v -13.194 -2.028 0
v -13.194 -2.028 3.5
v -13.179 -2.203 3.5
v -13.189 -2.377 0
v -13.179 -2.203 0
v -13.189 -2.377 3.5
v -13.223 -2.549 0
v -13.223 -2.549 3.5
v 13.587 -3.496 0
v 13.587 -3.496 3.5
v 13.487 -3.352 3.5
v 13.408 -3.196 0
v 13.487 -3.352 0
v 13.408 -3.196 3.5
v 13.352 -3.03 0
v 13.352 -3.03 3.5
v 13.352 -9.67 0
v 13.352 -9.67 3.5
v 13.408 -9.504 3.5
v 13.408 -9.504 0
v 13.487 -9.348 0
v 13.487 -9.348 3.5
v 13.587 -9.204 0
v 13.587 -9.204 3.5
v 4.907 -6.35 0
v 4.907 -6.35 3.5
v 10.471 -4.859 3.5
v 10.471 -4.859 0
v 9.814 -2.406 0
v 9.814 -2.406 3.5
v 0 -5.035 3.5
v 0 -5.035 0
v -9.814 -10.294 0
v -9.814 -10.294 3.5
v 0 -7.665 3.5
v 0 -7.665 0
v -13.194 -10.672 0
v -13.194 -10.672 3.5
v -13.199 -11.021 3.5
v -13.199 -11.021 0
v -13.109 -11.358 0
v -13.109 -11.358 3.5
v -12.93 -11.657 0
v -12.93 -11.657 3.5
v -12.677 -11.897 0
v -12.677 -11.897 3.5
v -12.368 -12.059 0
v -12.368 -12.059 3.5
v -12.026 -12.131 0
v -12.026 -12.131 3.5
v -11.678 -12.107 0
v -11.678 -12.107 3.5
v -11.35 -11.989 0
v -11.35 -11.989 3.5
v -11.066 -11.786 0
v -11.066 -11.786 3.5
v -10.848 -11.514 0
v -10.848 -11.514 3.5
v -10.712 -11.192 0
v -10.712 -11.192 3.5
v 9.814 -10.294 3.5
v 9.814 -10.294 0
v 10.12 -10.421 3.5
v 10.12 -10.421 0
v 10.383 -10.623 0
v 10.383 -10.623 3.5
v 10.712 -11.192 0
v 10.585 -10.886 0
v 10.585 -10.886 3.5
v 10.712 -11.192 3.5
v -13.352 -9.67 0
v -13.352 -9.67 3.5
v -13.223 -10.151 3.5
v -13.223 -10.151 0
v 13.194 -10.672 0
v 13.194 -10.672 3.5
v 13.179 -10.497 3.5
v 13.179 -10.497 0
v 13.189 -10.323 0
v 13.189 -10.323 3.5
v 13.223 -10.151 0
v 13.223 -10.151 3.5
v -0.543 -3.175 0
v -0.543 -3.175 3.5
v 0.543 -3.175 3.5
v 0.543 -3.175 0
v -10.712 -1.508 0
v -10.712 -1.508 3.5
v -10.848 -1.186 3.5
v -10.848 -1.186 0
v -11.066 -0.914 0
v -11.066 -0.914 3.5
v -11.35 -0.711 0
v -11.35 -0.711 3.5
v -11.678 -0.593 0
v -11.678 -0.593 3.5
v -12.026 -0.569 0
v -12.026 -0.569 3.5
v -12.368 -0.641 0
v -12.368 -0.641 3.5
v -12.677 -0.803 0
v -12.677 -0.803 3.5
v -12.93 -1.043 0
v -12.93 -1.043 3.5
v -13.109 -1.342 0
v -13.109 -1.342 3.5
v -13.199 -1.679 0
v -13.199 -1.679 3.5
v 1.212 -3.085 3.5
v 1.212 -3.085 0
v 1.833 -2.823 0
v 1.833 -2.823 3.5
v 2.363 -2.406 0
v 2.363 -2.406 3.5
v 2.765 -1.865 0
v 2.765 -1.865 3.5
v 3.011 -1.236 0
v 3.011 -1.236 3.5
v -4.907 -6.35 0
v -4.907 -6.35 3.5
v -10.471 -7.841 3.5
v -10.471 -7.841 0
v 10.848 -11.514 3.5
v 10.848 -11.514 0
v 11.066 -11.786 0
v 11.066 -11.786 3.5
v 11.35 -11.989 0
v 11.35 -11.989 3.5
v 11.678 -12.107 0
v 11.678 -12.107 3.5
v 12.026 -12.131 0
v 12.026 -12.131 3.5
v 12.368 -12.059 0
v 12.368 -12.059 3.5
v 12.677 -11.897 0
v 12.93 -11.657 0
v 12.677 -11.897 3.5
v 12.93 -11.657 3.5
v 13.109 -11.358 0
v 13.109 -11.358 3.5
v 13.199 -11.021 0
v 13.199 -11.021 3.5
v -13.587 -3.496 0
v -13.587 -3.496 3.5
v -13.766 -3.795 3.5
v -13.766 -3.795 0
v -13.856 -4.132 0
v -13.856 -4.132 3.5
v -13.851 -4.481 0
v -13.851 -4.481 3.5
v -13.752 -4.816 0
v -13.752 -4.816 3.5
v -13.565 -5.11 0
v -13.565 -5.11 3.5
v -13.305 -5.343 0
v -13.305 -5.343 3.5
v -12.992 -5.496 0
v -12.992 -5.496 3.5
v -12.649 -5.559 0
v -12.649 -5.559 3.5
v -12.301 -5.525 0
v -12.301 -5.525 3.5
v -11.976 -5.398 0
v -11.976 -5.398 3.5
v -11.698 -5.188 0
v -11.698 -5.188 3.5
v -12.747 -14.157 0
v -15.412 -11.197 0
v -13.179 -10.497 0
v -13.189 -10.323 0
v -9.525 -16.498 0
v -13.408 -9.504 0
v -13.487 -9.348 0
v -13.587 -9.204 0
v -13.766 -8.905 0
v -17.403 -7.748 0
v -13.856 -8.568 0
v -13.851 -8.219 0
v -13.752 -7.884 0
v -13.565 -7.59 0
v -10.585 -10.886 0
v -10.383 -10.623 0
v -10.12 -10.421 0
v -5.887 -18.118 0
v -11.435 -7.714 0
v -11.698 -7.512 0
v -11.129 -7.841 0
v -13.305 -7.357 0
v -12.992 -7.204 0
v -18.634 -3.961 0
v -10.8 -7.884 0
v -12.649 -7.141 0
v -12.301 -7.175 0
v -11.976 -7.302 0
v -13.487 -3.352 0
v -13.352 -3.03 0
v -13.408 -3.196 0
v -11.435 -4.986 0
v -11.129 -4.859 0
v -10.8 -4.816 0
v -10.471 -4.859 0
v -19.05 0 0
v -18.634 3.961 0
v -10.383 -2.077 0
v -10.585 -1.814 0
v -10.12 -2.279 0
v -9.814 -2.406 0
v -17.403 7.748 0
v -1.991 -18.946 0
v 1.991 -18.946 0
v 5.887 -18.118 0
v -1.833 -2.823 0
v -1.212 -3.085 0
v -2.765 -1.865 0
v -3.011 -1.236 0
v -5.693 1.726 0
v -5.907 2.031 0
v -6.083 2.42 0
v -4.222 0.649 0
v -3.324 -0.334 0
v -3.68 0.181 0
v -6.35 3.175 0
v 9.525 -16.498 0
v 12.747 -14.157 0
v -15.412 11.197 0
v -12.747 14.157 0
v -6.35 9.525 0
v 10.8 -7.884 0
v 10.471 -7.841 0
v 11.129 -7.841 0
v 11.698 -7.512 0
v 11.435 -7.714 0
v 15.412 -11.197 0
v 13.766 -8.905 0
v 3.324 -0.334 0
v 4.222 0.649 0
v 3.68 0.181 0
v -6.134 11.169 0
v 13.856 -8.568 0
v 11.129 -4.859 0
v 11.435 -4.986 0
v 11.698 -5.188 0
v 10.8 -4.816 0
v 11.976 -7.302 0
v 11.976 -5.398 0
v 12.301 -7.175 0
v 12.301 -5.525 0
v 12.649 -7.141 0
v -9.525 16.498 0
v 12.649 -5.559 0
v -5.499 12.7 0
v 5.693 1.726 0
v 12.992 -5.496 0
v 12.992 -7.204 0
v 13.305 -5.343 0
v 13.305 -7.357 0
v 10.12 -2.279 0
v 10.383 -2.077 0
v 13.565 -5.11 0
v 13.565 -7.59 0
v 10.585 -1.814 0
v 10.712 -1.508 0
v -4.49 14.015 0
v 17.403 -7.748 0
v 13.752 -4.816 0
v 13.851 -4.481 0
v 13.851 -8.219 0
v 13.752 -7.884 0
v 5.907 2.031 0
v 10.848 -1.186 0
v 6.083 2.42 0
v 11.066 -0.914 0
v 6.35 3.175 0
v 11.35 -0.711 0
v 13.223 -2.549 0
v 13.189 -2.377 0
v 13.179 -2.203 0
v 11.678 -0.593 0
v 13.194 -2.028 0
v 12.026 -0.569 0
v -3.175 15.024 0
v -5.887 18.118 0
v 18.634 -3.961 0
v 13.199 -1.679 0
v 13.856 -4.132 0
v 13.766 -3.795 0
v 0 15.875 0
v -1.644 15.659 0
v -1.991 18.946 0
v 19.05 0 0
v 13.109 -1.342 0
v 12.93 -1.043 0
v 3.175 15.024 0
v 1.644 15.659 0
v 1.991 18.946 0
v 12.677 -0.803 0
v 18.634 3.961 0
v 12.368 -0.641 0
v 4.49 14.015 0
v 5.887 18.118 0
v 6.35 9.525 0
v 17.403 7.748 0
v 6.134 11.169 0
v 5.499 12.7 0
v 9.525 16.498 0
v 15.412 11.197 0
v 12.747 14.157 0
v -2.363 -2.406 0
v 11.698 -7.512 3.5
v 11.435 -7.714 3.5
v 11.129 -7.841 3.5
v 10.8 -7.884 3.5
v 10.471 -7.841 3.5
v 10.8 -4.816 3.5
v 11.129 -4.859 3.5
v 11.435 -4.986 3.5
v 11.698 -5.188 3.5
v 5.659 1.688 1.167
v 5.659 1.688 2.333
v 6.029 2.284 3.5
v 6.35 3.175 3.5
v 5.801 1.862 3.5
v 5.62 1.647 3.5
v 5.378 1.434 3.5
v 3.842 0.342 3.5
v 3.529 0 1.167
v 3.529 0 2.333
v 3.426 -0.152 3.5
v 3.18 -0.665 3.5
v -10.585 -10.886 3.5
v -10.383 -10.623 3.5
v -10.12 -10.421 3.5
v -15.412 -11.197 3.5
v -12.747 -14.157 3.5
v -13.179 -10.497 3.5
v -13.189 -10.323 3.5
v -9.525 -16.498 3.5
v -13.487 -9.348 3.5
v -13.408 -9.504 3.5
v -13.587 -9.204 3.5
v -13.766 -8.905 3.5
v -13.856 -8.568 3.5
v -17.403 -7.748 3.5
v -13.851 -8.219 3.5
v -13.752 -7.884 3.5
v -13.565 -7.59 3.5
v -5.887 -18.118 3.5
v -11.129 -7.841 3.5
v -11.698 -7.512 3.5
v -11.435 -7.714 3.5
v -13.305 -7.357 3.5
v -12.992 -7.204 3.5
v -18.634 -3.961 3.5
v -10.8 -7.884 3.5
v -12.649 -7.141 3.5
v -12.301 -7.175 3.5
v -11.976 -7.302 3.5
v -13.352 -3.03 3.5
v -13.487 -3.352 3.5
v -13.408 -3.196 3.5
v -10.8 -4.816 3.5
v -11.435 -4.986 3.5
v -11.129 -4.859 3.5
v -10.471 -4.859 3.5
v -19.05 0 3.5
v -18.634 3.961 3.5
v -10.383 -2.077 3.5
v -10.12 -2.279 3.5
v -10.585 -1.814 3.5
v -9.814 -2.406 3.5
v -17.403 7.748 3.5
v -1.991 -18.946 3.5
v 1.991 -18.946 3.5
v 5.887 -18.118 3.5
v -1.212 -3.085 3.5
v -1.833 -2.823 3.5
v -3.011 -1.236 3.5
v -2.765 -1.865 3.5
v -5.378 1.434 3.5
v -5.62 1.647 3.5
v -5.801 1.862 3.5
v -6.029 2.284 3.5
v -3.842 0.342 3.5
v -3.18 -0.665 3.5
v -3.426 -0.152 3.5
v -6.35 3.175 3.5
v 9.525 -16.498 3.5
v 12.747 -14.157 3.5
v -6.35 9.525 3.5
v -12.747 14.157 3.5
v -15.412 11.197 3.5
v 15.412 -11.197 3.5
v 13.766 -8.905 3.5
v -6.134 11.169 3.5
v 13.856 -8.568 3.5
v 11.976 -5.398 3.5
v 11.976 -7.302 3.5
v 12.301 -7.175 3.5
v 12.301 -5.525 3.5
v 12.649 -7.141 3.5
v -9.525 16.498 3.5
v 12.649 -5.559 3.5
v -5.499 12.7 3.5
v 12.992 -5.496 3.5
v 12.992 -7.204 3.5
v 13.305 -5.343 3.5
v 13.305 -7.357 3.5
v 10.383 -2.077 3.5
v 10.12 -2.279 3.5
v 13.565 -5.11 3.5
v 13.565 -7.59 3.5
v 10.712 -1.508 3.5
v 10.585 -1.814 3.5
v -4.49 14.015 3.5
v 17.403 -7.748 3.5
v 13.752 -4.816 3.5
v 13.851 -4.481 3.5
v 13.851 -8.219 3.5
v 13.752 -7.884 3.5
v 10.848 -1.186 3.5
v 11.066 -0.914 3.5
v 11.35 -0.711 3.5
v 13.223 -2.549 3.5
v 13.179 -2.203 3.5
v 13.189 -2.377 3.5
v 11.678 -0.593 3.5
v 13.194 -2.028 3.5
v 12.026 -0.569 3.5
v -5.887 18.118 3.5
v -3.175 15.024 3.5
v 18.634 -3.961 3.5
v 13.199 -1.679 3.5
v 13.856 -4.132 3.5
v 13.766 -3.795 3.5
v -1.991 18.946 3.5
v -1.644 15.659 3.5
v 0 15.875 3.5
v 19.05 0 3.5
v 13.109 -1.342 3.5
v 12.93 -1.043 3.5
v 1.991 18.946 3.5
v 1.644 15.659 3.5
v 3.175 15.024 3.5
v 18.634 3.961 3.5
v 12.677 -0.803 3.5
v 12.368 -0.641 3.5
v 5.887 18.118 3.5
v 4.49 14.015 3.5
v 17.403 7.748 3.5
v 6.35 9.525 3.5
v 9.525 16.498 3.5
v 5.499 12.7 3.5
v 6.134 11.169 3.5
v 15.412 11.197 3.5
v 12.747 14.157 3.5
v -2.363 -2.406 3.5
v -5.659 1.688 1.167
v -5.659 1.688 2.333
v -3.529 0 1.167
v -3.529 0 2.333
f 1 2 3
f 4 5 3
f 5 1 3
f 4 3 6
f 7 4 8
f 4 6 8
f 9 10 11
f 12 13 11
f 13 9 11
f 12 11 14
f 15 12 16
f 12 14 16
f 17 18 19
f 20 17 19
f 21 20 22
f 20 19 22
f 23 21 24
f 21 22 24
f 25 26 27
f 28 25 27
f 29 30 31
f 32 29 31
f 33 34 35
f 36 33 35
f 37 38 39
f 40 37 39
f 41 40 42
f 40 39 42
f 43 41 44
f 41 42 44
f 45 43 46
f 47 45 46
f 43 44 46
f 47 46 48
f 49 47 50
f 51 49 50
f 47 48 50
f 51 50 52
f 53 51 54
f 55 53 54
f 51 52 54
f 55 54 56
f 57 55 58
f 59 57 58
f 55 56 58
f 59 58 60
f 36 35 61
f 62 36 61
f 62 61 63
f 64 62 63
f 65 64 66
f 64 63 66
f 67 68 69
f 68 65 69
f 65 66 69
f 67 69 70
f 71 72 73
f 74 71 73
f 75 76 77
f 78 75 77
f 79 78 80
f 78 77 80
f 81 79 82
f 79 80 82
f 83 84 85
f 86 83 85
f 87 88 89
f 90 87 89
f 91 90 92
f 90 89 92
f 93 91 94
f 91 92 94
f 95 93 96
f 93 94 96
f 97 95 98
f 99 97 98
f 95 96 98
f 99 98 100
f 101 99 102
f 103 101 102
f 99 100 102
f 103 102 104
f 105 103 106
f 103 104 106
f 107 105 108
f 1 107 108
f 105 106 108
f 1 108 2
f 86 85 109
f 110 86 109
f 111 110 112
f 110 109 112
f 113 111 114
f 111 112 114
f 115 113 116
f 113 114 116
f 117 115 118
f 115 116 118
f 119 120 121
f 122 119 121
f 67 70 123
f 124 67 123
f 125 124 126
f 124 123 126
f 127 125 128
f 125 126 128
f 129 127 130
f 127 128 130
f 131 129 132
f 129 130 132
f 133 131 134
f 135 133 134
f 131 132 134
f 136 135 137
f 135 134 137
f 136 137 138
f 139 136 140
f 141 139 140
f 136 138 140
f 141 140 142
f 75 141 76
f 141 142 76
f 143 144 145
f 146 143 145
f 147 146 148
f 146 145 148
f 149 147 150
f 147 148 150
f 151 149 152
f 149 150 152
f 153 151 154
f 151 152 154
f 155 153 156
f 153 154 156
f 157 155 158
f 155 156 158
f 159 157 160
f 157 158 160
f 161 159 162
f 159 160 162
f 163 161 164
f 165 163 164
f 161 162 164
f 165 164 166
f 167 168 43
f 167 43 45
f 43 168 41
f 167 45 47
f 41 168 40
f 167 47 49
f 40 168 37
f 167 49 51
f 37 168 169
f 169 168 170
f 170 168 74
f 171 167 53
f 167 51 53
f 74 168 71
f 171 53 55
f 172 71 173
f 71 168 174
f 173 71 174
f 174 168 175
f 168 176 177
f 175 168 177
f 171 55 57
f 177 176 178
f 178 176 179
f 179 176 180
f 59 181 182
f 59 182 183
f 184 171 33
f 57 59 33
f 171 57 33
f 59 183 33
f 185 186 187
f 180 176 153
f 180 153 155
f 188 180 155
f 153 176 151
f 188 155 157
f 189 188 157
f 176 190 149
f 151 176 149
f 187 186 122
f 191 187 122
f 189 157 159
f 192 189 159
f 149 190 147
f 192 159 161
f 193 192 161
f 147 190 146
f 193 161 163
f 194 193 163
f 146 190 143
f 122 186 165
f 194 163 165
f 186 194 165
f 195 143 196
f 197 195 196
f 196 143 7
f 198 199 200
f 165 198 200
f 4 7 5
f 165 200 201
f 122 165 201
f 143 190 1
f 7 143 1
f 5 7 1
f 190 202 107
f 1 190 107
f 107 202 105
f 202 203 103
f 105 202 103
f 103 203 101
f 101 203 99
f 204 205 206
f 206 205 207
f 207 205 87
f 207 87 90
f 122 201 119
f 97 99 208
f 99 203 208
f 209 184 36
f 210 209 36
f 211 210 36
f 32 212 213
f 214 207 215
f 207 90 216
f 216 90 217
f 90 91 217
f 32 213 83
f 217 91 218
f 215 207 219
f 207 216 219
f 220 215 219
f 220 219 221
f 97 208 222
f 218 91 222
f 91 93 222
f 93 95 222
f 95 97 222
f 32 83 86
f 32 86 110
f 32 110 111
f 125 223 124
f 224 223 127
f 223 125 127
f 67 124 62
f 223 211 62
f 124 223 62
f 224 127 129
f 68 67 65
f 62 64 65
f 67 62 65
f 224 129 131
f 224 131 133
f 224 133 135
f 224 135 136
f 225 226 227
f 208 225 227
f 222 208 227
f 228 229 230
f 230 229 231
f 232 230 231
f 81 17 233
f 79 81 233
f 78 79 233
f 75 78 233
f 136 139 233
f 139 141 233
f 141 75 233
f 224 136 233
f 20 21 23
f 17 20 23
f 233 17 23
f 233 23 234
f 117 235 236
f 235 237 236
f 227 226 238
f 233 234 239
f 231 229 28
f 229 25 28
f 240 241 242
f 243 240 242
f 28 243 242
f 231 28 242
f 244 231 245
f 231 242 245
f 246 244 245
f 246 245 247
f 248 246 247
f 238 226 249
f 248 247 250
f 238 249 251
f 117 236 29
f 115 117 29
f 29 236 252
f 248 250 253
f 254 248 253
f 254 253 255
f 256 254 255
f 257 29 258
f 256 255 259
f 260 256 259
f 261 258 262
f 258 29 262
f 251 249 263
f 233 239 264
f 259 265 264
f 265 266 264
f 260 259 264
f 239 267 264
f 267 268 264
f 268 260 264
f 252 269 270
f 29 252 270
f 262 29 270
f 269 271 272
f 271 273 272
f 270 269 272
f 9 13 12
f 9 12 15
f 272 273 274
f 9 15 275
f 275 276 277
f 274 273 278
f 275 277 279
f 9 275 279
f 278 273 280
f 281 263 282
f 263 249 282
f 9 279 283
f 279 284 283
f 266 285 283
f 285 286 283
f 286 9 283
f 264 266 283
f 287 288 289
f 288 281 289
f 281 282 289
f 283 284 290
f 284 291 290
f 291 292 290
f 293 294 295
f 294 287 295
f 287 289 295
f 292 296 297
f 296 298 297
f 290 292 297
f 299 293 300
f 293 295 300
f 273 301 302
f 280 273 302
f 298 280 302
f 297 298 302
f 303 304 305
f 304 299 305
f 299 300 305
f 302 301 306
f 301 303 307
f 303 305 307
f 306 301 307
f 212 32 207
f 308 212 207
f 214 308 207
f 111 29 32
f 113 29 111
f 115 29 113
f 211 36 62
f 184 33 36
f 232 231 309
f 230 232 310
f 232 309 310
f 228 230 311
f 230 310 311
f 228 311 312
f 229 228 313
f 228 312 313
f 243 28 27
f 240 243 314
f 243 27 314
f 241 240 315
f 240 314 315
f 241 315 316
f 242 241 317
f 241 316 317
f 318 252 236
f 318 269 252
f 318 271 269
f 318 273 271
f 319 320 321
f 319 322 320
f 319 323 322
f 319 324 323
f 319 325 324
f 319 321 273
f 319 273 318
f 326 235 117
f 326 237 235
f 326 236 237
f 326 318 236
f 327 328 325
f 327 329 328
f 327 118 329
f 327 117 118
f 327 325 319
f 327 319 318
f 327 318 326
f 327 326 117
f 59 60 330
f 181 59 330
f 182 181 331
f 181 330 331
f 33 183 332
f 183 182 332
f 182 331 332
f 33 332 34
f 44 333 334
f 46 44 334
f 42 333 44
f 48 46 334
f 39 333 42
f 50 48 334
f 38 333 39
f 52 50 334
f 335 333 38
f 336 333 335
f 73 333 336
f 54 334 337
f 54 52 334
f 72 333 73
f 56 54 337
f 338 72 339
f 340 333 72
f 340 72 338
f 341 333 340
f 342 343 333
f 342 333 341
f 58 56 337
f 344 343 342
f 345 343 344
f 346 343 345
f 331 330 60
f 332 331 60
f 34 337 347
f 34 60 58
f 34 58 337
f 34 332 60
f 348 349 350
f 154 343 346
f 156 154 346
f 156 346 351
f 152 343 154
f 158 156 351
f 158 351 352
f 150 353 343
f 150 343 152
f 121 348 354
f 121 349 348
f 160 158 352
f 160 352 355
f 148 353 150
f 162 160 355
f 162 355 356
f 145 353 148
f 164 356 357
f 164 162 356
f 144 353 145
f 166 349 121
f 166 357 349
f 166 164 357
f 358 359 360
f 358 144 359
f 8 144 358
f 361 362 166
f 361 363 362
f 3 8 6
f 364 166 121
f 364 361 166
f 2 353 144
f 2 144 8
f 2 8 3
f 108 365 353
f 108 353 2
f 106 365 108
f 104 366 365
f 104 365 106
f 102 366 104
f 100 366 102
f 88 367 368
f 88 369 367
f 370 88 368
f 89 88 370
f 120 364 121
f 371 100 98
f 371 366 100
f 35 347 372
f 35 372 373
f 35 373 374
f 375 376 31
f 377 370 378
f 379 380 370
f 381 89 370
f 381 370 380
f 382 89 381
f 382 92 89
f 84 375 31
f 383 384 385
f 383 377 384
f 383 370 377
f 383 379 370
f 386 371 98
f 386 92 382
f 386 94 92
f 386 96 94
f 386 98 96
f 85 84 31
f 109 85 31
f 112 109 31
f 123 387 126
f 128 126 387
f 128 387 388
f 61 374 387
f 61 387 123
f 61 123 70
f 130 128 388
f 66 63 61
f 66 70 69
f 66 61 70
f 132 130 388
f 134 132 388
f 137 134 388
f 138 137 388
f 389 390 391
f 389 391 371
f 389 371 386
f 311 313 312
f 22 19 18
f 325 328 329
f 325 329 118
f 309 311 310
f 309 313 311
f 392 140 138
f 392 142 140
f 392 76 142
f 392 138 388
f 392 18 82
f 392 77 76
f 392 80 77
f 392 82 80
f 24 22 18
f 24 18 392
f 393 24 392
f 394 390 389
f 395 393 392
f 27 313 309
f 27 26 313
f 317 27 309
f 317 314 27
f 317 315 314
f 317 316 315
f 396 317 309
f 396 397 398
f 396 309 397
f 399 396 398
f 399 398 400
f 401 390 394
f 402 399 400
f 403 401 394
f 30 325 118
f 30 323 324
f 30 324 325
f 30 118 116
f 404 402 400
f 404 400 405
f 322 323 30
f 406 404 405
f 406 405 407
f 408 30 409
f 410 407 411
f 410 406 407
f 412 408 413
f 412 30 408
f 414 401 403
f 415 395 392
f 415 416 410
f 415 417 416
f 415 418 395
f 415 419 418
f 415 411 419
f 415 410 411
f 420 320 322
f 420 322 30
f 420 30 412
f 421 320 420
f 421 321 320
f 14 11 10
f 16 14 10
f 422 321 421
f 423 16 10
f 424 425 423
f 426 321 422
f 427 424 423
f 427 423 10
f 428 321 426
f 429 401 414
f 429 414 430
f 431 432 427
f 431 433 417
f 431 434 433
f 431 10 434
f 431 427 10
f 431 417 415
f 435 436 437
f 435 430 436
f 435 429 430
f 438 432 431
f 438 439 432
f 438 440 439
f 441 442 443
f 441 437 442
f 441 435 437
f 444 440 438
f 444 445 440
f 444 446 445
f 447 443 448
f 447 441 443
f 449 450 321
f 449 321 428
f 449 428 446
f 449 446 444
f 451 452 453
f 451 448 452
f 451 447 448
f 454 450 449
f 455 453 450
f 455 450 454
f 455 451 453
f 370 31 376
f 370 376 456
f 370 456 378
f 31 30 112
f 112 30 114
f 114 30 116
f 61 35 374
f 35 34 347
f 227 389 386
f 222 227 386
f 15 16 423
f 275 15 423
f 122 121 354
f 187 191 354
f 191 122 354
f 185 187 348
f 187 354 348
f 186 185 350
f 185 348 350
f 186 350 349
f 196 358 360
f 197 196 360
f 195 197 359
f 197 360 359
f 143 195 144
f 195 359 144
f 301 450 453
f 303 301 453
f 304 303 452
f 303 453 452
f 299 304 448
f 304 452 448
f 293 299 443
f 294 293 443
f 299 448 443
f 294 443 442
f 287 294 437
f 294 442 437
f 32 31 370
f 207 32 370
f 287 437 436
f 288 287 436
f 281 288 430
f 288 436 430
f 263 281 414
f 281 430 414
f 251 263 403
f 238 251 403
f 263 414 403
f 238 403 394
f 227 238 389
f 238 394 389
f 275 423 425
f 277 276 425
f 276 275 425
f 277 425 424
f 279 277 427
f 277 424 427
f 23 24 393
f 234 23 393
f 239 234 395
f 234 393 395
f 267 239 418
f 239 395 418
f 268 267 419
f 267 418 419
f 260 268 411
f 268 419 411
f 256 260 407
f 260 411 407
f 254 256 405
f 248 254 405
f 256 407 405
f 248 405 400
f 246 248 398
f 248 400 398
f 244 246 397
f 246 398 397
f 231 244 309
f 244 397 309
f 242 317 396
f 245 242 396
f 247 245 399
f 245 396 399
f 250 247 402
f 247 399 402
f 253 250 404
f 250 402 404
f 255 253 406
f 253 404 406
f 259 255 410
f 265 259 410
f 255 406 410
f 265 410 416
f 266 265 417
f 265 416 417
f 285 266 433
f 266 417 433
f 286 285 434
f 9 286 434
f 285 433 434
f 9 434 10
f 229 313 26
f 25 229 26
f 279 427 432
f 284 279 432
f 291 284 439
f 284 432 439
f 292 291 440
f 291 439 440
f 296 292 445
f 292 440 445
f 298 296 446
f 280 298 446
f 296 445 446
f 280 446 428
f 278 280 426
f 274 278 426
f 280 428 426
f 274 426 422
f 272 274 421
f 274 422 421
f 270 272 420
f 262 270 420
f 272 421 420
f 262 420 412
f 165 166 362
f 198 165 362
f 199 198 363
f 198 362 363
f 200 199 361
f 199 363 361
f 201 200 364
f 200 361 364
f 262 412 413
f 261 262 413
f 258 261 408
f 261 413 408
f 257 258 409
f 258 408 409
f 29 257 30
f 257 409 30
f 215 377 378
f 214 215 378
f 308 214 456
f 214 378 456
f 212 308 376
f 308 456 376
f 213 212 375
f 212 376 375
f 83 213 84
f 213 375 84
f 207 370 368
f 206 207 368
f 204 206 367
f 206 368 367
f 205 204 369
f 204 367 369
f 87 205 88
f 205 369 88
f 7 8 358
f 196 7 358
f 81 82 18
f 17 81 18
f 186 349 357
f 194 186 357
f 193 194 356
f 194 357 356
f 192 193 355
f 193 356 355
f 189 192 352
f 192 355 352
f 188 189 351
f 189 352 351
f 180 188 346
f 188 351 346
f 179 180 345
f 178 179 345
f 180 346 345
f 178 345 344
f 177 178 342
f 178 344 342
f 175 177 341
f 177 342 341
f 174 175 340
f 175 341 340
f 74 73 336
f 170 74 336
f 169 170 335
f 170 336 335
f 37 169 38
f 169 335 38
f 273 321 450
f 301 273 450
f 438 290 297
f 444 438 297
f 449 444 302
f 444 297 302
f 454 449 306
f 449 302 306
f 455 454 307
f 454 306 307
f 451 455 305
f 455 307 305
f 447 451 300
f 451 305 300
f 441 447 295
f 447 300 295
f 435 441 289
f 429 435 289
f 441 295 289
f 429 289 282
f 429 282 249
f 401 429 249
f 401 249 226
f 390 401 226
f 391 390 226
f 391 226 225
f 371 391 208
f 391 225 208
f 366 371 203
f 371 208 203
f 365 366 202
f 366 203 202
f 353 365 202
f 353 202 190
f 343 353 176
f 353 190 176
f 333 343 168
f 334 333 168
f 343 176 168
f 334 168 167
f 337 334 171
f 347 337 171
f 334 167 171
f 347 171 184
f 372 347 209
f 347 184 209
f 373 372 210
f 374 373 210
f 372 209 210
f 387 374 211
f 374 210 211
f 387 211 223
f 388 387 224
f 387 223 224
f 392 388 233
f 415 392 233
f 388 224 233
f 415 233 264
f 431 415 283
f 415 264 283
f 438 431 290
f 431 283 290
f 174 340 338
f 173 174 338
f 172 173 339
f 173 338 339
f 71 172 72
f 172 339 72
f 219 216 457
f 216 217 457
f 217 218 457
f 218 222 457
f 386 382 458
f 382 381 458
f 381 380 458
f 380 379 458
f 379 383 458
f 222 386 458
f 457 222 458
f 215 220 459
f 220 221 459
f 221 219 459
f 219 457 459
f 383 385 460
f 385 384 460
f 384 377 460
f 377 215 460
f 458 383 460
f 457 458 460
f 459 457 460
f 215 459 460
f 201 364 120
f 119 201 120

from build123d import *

# Parameters (mm, degrees)
F0_R     = 19.05
F1_DEPTH = 3.5
F3_DEPTH = 5.334
F5_DEPTH = 25.4


# Not quite as in the source:
# - a feature names something its author has since deleted; it is built from what else it names


with BuildPart() as f1:
    # F0 (on Top) → F1 (new body)
    with BuildSketch(Plane.XY):
        Circle(F0_R)
    extrude(amount=F1_DEPTH)

    # F2 (on face) → F3 (cut)
    with BuildSketch(Plane.XY.offset(3.5)):
        with BuildLine():
            Line((0, -3.175), (0.5430206191, -3.175))
            ThreePointArc((0.5430206191, -3.175), (2.1121063082, -2.6323908231), (3.0107980648, -1.2363937796))
            add(Edge.make_bspline(
                [(6.35, 3.175), (6.1354222845, 2.6541048515), (5.9660194487, 1.4359488031), (3.5744657813, 0.5479613391), (3.1233221277, -0.7746591325), (3.0107980648, -1.2363937796)],
                knots=[0, 0, 0, 0, 0.2694475223, 0.6162953248, 0.7809262502, 0.7809262502, 0.7809262502, 0.7809262502], degree=3))
            Line((6.35, 3.175), (6.35, 9.525))
            ThreePointArc((6.35, 9.525), (4.4901280605, 14.0151280605), (0, 15.875))
            Line((0, 15.875), (0, -3.175))
        make_face()
        with BuildLine():
            Line((-0.5430206191, -3.175), (0, -3.175))
            Line((0, -3.175), (0, 15.875))
            ThreePointArc((0, 15.875), (-4.4901280605, 14.0151280605), (-6.35, 9.525))
            Line((-6.35, 9.525), (-6.35, 3.175))
            add(Edge.make_bspline(
                [(-6.35, 3.175), (-6.1354222845, 2.6541048515), (-5.9660194487, 1.4359488031), (-3.5744657813, 0.5479613391), (-3.1233221277, -0.7746591325), (-3.0107980648, -1.2363937796)],
                knots=[0, 0, 0, 0, 0.2694475223, 0.6162953248, 0.7809262502, 0.7809262502, 0.7809262502, 0.7809262502], degree=3))
            ThreePointArc((-3.0107980648, -1.2363937796), (-2.1121063082, -2.6323908231), (-0.5430206191, -3.175))
        make_face()
    extrude(amount=-F3_DEPTH, mode=Mode.SUBTRACT)

    # F4 (on face) → F5 (cut)
    with BuildSketch(Plane.XY.offset(3.5)):
        with BuildLine():
            Line((-12.2672579939, -3.0629981272), (-11.9385578066, -1.8362723278))
            Line((-11.9385578066, -1.8362723278), (-9.8138063951, -2.4055977526))
            ThreePointArc((-9.8138063951, -2.4055977526), (-10.3831318199, -2.0768975654), (-10.7118320072, -1.5075721405))
            ThreePointArc((-10.7118320072, -1.5075721405), (-12.1993062273, -0.5933281371), (-13.1939593601, -2.0282799825))
            ThreePointArc((-13.1939593601, -2.0282799825), (-13.1812823619, -2.2901216321), (-13.2226351142, -2.5489878245))
            Line((-13.2226351142, -2.5489878245), (-13.3516440016, -3.030455547))
            ThreePointArc((-13.3516440016, -3.030455547), (-13.4452645639, -3.2753166219), (-13.5871639911, -3.4957396431))
            ThreePointArc((-13.5871639911, -3.4957396431), (-13.4432450328, -5.2357709608), (-11.697932569, -5.1877495387))
            ThreePointArc((-11.697932569, -5.1877495387), (-11.1286071442, -4.8590493514), (-10.4712067697, -4.8590493514))
            Line((-10.4712067697, -4.8590493514), (-12.5959581812, -4.2897239266))
            Line((-12.5959581812, -4.2897239266), (-12.2672579939, -3.0629981272))
        make_face()
        Polygon((-9.8138063951, -2.4055977526), (-11.9385578066, -1.8362723278), (-12.2672579939, -3.0629981272), (-2.4534515988, -5.6925996254), (0, -5.0351992509), align=None)
        Polygon((-2.4534515988, -5.6925996254), (-12.2672579939, -3.0629981272), (-12.5959581812, -4.2897239266), (-10.4712067697, -4.8590493514), (-4.9069031975, -6.35), align=None)
        with BuildLine():
            Line((9.8138063951, -2.4055977526), (0, -5.0351992509))
            Line((0, -5.0351992509), (2.4534515988, -5.6925996254))
            Line((2.4534515988, -5.6925996254), (4.9069031975, -6.35))
            Line((4.9069031975, -6.35), (10.4712067697, -4.8590493514))
            ThreePointArc((10.4712067697, -4.8590493514), (11.1286071442, -4.8590493514), (11.697932569, -5.1877495387))
            ThreePointArc((11.697932569, -5.1877495387), (13.4432450328, -5.2357709608), (13.5871639911, -3.4957396431))
            ThreePointArc((13.5871639911, -3.4957396431), (13.4452645639, -3.2753166219), (13.3516440016, -3.030455547))
            Line((13.3516440016, -3.030455547), (13.2226351142, -2.5489878245))
            ThreePointArc((13.2226351142, -2.5489878245), (13.1812823619, -2.2901216321), (13.1939593601, -2.0282799825))
            ThreePointArc((13.1939593601, -2.0282799825), (12.1993062273, -0.5933281371), (10.7118320072, -1.5075721405))
            ThreePointArc((10.7118320072, -1.5075721405), (10.3831318199, -2.0768975654), (9.8138063951, -2.4055977526))
        make_face()
        Polygon((0, -6.35), (0, -5.0351992509), (-2.4534515988, -5.6925996254), align=None)
        Polygon((2.4534515988, -5.6925996254), (0, -5.0351992509), (0, -6.35), align=None)
        Polygon((0, -6.35), (-2.4534515988, -5.6925996254), (-4.9069031975, -6.35), (-2.4534515988, -7.0074003746), align=None)
        Polygon((4.9069031975, -6.35), (2.4534515988, -5.6925996254), (0, -6.35), align=None)
        Polygon((4.9069031975, -6.35), (0, -6.35), (2.4534515988, -7.0074003746), align=None)
        Polygon((2.4534515988, -7.0074003746), (0, -6.35), (-2.4534515988, -7.0074003746), (0, -7.6648007491), align=None)
        Polygon((-2.4534515988, -7.0074003746), (-4.9069031975, -6.35), (-10.4712067697, -7.8409506486), (-12.5959581812, -8.4102760734), (-12.2672579939, -9.6370018728), align=None)
        Polygon((10.4712067697, -7.8409506486), (4.9069031975, -6.35), (2.4534515988, -7.0074003746), (12.2672579939, -9.6370018728), (12.5959581812, -8.4102760734), align=None)
        Polygon((12.2672579939, -9.6370018728), (2.4534515988, -7.0074003746), (0, -7.6648007491), (9.8138063951, -10.2944022474), (11.9385578066, -10.8637276722), align=None)
        Polygon((0, -7.6648007491), (-2.4534515988, -7.0074003746), (-12.2672579939, -9.6370018728), (-11.9385578066, -10.8637276722), (-9.8138063951, -10.2944022474), align=None)
        with BuildLine():
            Line((-12.5959581812, -8.4102760734), (-10.4712067697, -7.8409506486))
            ThreePointArc((-10.4712067697, -7.8409506486), (-11.1286071442, -7.8409506486), (-11.697932569, -7.5122504613))
            ThreePointArc((-11.697932569, -7.5122504613), (-13.4432450328, -7.4642290392), (-13.5871639911, -9.2042603569))
            ThreePointArc((-13.5871639911, -9.2042603569), (-13.4452645639, -9.4246833781), (-13.3516440016, -9.669544453))
            Line((-13.3516440016, -9.669544453), (-13.2226351142, -10.1510121755))
            ThreePointArc((-13.2226351142, -10.1510121755), (-13.1812823619, -10.4098783679), (-13.1939593601, -10.6717200175))
            ThreePointArc((-13.1939593601, -10.6717200175), (-12.1993062273, -12.1066718629), (-10.7118320072, -11.1924278595))
            ThreePointArc((-10.7118320072, -11.1924278595), (-10.3831318199, -10.6231024346), (-9.8138063951, -10.2944022474))
            Line((-9.8138063951, -10.2944022474), (-11.9385578066, -10.8637276722))
            Line((-11.9385578066, -10.8637276722), (-12.2672579939, -9.6370018728))
            Line((-12.2672579939, -9.6370018728), (-12.5959581812, -8.4102760734))
        make_face()
        with BuildLine():
            ThreePointArc((11.697932569, -7.5122504613), (11.1286071442, -7.8409506486), (10.4712067697, -7.8409506486))
            Line((10.4712067697, -7.8409506486), (12.5959581812, -8.4102760734))
            Line((12.5959581812, -8.4102760734), (12.2672579939, -9.6370018728))
            Line((12.2672579939, -9.6370018728), (11.9385578066, -10.8637276722))
            Line((11.9385578066, -10.8637276722), (9.8138063951, -10.2944022474))
            ThreePointArc((9.8138063951, -10.2944022474), (10.3831318199, -10.6231024346), (10.7118320072, -11.1924278595))
            ThreePointArc((10.7118320072, -11.1924278595), (12.1993062273, -12.1066718629), (13.1939593601, -10.6717200175))
            ThreePointArc((13.1939593601, -10.6717200175), (13.1812823619, -10.4098783679), (13.2226351142, -10.1510121755))
            Line((13.2226351142, -10.1510121755), (13.3516440016, -9.669544453))
            ThreePointArc((13.3516440016, -9.669544453), (13.4452645639, -9.4246833781), (13.5871639911, -9.2042603569))
            ThreePointArc((13.5871639911, -9.2042603569), (13.4432450328, -7.4642290392), (11.697932569, -7.5122504613))
        make_face()
    extrude(amount=-F5_DEPTH, mode=Mode.SUBTRACT)


solid = f1.part
